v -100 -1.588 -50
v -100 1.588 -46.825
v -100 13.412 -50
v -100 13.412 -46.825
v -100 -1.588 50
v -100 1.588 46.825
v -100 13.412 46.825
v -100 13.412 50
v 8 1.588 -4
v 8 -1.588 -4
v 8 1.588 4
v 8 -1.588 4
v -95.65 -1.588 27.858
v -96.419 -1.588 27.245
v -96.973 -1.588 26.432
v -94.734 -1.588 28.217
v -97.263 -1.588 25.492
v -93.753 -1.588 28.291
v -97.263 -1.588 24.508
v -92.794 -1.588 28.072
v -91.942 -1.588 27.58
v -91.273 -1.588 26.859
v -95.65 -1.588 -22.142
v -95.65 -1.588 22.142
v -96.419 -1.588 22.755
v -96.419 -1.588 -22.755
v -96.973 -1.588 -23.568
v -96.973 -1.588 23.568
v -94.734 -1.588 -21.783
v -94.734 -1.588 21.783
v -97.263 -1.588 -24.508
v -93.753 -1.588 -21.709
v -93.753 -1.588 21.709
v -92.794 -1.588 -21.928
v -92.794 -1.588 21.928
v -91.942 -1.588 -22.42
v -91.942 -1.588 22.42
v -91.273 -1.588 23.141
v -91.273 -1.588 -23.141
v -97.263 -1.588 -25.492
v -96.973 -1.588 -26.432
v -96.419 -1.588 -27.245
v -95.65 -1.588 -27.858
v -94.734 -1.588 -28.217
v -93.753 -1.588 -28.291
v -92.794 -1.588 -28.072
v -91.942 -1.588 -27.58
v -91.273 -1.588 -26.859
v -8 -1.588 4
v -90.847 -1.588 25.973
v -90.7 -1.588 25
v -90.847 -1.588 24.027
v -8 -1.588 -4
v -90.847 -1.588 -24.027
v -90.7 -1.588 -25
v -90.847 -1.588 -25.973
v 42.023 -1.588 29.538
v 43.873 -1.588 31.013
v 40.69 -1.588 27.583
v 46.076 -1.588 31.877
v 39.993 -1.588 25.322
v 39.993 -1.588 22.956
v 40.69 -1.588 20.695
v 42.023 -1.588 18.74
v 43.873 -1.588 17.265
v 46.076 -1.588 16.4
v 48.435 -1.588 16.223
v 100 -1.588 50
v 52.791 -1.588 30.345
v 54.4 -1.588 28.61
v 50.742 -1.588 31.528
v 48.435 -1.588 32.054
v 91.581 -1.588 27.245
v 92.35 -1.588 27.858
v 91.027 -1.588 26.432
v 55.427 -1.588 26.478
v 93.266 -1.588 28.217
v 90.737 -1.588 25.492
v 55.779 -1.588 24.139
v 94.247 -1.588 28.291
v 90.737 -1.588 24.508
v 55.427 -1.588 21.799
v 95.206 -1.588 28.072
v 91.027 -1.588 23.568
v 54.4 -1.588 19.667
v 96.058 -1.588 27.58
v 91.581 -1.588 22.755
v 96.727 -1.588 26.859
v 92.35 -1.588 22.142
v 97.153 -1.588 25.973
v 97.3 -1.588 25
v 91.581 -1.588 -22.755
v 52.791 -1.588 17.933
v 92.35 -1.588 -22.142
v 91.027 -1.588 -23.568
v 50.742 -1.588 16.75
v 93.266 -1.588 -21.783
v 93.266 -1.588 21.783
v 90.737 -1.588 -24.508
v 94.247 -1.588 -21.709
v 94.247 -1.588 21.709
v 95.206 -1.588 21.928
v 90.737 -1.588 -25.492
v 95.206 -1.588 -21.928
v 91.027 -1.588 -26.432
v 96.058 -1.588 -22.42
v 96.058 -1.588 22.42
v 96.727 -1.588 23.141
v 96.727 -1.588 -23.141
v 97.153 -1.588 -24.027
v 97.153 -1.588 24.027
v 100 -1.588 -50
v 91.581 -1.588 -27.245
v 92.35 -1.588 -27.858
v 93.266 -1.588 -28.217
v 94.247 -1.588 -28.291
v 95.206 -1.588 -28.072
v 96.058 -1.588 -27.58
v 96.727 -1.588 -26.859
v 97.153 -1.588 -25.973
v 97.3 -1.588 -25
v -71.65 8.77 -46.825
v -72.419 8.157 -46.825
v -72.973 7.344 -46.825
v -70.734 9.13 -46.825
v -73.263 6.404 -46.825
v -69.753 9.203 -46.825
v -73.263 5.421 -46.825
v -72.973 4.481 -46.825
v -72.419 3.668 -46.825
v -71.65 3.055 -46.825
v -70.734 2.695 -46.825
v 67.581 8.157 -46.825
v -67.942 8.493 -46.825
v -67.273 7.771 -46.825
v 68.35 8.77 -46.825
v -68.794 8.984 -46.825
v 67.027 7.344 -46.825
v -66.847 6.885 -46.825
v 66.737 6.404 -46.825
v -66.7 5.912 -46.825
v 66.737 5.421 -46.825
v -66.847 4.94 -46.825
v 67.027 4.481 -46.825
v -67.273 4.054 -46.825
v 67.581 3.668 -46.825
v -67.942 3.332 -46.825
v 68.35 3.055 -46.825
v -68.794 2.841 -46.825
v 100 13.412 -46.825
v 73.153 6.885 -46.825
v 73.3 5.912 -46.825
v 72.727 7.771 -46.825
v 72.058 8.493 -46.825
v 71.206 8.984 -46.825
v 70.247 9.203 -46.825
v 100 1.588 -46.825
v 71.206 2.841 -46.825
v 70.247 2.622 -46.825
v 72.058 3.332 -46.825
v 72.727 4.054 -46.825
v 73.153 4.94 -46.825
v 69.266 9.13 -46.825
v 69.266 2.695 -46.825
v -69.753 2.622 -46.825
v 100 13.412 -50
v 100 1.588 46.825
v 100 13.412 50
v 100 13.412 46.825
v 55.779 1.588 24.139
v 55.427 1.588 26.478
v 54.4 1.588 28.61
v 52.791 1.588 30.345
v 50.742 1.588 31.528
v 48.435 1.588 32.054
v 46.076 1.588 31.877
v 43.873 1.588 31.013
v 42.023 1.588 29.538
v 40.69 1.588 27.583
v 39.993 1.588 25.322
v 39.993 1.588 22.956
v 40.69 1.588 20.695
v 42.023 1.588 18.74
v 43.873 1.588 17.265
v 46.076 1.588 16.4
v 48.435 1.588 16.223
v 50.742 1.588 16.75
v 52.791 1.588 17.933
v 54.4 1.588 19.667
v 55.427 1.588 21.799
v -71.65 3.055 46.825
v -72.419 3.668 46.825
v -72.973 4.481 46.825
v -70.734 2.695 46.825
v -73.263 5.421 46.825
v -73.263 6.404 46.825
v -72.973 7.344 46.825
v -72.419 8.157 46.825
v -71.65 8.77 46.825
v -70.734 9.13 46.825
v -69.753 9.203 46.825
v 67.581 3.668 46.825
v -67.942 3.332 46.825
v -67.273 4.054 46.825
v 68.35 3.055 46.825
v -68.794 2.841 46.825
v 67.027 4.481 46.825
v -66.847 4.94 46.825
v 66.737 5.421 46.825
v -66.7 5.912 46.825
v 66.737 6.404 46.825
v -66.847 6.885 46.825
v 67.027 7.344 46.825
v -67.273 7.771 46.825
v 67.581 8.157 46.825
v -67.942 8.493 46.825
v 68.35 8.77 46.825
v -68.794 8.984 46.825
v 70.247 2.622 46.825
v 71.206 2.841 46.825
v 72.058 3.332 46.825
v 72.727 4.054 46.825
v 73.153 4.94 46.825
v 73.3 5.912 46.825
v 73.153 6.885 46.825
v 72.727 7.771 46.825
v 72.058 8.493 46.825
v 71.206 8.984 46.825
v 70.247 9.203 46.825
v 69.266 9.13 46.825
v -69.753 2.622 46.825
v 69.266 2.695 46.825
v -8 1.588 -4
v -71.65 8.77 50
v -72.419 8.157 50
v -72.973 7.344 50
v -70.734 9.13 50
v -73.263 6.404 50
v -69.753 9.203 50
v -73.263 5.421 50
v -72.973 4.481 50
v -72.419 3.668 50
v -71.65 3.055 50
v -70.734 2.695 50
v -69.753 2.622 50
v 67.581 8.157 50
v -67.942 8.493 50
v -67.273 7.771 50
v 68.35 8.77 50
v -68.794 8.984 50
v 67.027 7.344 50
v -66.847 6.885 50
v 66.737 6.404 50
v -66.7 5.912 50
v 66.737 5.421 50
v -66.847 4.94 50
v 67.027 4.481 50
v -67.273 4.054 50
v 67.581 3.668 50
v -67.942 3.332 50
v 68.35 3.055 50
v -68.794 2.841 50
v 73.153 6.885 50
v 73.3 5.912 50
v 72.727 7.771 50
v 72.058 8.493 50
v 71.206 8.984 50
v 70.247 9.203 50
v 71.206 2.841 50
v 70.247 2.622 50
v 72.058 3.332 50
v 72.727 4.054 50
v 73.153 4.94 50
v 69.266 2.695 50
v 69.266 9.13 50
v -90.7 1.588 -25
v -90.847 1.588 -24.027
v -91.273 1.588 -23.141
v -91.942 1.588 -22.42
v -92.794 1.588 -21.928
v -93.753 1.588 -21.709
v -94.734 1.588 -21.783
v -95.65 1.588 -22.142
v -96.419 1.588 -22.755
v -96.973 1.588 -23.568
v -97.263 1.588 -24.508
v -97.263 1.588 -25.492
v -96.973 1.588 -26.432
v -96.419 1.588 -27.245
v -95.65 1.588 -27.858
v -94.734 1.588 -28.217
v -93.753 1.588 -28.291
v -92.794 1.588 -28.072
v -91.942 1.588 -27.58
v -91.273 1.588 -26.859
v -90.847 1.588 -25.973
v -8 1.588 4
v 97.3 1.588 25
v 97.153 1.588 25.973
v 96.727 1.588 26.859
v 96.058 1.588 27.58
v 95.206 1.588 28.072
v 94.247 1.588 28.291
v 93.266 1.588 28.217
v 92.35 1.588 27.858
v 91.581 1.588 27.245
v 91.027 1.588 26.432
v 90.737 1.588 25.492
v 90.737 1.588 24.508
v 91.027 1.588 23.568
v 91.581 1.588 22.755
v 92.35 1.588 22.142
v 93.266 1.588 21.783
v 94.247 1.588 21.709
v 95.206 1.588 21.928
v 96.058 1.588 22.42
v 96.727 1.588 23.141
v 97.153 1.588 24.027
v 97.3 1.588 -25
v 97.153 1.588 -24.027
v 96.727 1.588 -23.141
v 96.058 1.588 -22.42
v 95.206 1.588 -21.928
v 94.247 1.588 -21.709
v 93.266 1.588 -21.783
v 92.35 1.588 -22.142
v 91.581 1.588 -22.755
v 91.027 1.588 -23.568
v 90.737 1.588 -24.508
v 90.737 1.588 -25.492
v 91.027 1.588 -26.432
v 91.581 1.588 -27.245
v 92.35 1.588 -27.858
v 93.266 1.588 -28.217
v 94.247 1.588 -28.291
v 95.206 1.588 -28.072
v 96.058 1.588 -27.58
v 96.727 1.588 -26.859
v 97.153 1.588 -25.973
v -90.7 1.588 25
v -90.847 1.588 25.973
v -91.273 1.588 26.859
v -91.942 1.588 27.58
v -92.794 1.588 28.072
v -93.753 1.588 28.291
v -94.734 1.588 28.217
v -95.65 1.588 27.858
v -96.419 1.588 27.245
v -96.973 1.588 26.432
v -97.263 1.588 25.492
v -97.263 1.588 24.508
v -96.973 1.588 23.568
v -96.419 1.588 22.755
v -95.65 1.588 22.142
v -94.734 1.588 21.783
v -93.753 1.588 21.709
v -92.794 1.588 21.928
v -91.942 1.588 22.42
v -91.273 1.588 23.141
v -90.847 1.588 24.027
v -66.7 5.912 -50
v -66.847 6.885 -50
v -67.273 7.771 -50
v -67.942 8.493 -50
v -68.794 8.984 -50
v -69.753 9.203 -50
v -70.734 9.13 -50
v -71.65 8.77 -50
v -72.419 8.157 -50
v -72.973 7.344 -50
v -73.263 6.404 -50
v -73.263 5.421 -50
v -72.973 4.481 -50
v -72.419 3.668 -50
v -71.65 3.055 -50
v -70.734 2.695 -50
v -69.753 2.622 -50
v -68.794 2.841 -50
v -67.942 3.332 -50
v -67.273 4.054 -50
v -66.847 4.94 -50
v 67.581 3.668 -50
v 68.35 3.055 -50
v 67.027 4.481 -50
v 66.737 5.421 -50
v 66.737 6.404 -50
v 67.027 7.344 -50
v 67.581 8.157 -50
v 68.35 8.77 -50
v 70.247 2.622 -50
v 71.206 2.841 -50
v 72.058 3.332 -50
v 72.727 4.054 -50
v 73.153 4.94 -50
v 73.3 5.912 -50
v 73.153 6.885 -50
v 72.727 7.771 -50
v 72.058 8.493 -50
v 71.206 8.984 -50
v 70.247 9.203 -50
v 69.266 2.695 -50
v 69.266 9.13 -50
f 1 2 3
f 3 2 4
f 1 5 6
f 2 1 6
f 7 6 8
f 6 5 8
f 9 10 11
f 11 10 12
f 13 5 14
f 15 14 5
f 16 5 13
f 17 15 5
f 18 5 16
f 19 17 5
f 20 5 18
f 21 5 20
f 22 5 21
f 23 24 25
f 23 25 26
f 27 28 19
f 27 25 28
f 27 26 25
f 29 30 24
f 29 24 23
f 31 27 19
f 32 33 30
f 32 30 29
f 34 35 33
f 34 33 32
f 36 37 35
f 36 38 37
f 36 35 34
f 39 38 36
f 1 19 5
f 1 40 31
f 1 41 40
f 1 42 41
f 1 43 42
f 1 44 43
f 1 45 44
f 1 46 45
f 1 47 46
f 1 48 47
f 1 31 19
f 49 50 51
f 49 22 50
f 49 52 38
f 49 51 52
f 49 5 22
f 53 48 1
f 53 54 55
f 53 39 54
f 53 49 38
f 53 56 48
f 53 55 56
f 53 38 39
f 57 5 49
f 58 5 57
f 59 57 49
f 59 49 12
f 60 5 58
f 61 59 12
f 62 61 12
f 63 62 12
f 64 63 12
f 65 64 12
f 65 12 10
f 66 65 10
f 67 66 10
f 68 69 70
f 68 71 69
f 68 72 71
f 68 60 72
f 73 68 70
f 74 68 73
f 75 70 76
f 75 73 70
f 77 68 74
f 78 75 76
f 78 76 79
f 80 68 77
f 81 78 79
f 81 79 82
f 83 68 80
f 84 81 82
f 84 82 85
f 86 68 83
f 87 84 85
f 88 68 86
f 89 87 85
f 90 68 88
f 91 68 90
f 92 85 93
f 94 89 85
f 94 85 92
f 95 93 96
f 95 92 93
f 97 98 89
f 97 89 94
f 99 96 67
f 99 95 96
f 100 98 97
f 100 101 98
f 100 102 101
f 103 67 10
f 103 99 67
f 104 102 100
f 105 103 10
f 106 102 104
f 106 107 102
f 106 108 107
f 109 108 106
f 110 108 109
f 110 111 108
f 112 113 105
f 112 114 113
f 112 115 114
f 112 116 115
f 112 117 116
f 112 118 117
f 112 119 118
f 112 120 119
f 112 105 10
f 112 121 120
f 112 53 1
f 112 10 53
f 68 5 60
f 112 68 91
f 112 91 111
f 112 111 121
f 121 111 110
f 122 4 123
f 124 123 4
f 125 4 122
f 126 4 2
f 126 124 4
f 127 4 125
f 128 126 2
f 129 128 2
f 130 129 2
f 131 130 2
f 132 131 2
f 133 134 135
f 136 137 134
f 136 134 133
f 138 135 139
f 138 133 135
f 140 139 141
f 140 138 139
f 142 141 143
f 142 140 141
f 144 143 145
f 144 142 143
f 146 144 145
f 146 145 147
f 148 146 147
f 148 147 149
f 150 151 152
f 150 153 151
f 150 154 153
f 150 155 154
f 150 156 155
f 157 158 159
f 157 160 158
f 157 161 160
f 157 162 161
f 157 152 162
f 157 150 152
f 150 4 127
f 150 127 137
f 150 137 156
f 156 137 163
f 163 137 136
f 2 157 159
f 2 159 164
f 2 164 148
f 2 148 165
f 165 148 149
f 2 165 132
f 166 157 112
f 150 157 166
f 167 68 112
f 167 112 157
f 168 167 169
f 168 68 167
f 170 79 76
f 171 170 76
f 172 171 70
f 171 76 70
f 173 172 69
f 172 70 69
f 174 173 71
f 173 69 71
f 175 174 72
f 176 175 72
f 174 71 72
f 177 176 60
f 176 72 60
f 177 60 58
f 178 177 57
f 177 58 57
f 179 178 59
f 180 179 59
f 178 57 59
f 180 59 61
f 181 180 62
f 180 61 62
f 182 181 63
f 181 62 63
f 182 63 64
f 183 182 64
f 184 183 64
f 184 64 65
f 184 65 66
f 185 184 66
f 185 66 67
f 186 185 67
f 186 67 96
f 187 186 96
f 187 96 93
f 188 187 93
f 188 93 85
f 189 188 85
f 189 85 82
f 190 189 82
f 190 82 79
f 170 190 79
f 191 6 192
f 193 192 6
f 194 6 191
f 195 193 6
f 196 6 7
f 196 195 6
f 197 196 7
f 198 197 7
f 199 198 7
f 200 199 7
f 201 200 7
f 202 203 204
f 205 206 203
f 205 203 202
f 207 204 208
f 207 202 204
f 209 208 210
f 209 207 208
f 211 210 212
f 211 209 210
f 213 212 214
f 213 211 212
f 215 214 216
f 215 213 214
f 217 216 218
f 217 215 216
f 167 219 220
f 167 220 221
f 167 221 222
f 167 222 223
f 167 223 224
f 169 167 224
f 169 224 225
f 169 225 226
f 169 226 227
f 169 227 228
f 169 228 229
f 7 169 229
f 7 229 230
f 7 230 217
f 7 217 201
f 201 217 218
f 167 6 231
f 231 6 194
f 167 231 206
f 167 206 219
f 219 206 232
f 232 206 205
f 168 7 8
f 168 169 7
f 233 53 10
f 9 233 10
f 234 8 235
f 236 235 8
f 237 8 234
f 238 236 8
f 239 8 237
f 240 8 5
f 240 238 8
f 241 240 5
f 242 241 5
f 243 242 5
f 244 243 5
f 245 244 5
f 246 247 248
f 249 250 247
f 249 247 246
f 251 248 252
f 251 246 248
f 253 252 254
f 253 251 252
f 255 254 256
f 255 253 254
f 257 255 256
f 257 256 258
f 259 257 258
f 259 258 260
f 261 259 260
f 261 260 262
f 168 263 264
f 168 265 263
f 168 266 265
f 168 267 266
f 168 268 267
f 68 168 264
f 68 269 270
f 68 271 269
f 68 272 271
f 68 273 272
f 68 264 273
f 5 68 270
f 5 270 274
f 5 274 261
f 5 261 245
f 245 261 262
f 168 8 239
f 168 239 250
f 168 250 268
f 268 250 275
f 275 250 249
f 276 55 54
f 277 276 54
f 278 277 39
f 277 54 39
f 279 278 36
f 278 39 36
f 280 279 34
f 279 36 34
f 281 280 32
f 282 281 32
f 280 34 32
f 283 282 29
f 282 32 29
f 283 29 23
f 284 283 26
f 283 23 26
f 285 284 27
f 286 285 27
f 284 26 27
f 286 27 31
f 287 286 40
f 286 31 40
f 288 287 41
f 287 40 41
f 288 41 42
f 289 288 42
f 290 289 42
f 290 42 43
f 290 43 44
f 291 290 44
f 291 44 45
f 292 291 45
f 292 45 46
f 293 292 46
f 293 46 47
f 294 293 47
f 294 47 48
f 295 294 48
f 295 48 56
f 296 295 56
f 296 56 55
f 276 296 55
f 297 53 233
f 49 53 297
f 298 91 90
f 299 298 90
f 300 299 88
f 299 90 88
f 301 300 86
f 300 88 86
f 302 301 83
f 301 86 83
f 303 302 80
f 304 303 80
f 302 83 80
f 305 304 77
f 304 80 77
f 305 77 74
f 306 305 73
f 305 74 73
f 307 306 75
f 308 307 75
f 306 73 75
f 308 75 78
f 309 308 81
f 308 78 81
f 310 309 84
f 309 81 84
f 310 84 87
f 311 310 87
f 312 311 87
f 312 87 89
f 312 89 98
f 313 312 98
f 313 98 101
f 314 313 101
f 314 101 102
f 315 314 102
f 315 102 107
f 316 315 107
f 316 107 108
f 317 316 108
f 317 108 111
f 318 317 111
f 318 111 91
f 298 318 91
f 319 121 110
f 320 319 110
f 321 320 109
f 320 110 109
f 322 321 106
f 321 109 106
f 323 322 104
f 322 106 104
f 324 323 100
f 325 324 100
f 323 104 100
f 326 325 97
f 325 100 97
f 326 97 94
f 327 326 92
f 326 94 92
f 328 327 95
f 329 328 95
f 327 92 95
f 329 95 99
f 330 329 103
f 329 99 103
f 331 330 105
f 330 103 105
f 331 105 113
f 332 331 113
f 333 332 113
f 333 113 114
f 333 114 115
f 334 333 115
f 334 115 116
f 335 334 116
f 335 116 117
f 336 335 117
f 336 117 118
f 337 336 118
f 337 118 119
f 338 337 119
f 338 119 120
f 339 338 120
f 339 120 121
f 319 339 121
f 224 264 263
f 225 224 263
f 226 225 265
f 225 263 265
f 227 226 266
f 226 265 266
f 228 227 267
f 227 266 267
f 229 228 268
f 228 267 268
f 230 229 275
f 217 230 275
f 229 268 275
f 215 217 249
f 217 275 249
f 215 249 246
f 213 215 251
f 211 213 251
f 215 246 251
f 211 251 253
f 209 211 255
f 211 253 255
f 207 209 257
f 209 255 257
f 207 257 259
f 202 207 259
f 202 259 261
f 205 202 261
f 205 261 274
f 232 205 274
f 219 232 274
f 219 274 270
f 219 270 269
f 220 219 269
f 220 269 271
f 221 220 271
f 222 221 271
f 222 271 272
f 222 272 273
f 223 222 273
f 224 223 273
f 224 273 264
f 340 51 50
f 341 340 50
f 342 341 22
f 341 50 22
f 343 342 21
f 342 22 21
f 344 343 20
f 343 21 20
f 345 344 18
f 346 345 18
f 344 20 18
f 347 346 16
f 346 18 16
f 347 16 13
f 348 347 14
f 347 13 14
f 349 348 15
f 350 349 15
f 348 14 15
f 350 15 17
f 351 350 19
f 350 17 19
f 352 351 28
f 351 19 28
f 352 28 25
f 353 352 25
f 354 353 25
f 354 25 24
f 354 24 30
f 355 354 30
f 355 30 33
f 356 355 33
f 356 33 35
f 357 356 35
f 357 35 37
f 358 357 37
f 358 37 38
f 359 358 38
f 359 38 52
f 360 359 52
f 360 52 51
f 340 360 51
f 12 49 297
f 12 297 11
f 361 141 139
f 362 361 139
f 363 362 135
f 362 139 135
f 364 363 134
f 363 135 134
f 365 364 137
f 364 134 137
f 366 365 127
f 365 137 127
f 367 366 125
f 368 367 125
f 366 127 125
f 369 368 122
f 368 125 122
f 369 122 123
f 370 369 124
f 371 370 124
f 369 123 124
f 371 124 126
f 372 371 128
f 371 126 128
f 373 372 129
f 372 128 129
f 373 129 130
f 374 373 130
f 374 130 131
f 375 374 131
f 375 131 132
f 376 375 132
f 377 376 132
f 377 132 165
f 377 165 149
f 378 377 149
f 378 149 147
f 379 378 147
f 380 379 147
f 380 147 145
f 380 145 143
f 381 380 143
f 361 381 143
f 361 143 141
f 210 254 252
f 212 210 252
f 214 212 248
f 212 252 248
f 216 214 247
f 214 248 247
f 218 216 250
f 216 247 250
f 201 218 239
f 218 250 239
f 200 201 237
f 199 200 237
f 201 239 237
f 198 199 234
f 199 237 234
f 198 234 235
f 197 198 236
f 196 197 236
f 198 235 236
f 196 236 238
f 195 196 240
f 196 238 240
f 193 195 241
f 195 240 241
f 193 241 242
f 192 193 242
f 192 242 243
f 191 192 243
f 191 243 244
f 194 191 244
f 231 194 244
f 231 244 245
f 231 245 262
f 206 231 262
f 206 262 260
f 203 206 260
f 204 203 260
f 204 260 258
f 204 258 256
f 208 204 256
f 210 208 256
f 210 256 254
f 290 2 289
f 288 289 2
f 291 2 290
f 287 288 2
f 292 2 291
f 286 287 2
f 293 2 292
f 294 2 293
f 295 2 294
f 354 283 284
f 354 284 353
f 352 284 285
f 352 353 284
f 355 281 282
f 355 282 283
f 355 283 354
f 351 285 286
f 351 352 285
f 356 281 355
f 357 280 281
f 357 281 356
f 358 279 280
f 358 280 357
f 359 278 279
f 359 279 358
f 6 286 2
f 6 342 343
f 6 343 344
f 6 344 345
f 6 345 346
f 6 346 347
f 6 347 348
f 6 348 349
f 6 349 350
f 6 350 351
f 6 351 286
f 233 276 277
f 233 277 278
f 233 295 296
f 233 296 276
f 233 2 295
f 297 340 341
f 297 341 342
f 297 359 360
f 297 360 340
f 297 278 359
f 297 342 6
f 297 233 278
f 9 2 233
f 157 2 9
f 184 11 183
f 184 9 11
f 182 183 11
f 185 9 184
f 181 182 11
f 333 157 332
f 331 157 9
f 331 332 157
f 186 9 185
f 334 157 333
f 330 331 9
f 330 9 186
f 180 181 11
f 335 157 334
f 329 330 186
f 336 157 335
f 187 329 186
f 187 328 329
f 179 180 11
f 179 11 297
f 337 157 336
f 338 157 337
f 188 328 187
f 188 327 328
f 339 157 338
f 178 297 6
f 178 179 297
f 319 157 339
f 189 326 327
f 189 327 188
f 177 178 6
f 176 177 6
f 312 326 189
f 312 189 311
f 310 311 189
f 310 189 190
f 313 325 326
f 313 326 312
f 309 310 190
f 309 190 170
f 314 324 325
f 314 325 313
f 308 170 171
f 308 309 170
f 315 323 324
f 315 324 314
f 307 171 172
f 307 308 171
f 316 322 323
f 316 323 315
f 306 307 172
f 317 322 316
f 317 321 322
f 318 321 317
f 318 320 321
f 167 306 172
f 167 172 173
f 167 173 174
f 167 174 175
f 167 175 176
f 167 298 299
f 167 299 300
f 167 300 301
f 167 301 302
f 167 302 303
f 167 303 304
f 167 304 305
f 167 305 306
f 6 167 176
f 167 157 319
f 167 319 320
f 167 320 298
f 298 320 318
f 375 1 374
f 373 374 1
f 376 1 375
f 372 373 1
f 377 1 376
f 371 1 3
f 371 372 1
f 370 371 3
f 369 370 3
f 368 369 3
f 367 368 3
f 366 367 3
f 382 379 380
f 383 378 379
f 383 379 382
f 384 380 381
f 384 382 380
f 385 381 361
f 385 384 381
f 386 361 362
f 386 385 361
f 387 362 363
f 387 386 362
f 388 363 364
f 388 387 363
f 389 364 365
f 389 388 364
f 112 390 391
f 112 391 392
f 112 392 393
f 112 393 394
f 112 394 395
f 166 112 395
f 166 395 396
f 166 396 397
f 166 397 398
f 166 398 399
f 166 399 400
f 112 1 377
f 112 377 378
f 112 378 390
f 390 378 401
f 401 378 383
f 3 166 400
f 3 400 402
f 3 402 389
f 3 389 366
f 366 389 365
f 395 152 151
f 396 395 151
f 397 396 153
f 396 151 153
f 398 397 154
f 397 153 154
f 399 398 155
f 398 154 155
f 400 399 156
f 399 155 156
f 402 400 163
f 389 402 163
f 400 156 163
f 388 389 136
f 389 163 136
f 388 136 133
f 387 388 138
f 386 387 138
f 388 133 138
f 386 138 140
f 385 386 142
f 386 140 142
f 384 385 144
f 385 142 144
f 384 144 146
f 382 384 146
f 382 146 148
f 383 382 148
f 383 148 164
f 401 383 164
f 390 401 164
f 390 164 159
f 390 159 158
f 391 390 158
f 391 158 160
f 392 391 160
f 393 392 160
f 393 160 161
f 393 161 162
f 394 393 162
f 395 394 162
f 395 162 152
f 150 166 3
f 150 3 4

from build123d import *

# Parameters (mm, degrees)
F1_DEPTH      = 100
F2_W          = 16
F2_H          = 8
F2_R          = 3.3
F3_DEPTH      = 228
F3_DEPTH_BACK = 15.001
F4_R          = 3.3
F5_DEPTH      = 100.001
F6_R          = 7.9375
F7_DEPTH      = 15.001


# Not quite as in the source:
# - an extrude ends at something that could not be found from the text; its depth is read off the source's solid


with BuildPart() as f1:
    # F0 (on Right) → F1 (new body, symmetric)
    with BuildSketch(Plane.YZ):
        Polygon((13.4125, 50), (1.5875, 50), (-1.5875, 50), (-1.5875, 46.825), (-1.5875, -46.825), (-1.5875, -50), (1.5875, -50), (13.4125, -50), (13.4125, -46.825), (1.5875, -46.825), (1.5875, 46.825), (13.4125, 46.825), align=None)
    extrude(amount=F1_DEPTH, both=True)

    # F2 (on face) → F3 (cut, two sides)
    with BuildSketch(Plane.XZ.offset(1.5875)) as f3_sk:
        Rectangle(F2_W, F2_H)
        with Locations((94, -25)):
            Circle(F2_R)
        with Locations((94, 25)):
            Circle(F2_R)
        with Locations((-94, -25)):
            Circle(F2_R)
        with Locations((-94, 25)):
            Circle(F2_R)
    extrude(amount=F3_DEPTH, mode=Mode.SUBTRACT)
    extrude(f3_sk.sketch, amount=-F3_DEPTH_BACK, mode=Mode.SUBTRACT)

    # F4 (on face) → F5 (cut, through all)
    with BuildSketch(Plane.XY.offset(50)):
        with Locations((-70, 5.9125)):
            Circle(F4_R)
        with Locations((70, 5.9125)):
            Circle(F4_R)
    extrude(amount=-F5_DEPTH, mode=Mode.SUBTRACT)

    # F6 (on face) → F7 (cut, through all)
    with BuildSketch(Plane.XZ.offset(1.5875)):
        with Locations((47.8418069781, 24.1387402225)):
            Circle(F6_R)
    extrude(amount=-F7_DEPTH, mode=Mode.SUBTRACT)


solid = f1.part
